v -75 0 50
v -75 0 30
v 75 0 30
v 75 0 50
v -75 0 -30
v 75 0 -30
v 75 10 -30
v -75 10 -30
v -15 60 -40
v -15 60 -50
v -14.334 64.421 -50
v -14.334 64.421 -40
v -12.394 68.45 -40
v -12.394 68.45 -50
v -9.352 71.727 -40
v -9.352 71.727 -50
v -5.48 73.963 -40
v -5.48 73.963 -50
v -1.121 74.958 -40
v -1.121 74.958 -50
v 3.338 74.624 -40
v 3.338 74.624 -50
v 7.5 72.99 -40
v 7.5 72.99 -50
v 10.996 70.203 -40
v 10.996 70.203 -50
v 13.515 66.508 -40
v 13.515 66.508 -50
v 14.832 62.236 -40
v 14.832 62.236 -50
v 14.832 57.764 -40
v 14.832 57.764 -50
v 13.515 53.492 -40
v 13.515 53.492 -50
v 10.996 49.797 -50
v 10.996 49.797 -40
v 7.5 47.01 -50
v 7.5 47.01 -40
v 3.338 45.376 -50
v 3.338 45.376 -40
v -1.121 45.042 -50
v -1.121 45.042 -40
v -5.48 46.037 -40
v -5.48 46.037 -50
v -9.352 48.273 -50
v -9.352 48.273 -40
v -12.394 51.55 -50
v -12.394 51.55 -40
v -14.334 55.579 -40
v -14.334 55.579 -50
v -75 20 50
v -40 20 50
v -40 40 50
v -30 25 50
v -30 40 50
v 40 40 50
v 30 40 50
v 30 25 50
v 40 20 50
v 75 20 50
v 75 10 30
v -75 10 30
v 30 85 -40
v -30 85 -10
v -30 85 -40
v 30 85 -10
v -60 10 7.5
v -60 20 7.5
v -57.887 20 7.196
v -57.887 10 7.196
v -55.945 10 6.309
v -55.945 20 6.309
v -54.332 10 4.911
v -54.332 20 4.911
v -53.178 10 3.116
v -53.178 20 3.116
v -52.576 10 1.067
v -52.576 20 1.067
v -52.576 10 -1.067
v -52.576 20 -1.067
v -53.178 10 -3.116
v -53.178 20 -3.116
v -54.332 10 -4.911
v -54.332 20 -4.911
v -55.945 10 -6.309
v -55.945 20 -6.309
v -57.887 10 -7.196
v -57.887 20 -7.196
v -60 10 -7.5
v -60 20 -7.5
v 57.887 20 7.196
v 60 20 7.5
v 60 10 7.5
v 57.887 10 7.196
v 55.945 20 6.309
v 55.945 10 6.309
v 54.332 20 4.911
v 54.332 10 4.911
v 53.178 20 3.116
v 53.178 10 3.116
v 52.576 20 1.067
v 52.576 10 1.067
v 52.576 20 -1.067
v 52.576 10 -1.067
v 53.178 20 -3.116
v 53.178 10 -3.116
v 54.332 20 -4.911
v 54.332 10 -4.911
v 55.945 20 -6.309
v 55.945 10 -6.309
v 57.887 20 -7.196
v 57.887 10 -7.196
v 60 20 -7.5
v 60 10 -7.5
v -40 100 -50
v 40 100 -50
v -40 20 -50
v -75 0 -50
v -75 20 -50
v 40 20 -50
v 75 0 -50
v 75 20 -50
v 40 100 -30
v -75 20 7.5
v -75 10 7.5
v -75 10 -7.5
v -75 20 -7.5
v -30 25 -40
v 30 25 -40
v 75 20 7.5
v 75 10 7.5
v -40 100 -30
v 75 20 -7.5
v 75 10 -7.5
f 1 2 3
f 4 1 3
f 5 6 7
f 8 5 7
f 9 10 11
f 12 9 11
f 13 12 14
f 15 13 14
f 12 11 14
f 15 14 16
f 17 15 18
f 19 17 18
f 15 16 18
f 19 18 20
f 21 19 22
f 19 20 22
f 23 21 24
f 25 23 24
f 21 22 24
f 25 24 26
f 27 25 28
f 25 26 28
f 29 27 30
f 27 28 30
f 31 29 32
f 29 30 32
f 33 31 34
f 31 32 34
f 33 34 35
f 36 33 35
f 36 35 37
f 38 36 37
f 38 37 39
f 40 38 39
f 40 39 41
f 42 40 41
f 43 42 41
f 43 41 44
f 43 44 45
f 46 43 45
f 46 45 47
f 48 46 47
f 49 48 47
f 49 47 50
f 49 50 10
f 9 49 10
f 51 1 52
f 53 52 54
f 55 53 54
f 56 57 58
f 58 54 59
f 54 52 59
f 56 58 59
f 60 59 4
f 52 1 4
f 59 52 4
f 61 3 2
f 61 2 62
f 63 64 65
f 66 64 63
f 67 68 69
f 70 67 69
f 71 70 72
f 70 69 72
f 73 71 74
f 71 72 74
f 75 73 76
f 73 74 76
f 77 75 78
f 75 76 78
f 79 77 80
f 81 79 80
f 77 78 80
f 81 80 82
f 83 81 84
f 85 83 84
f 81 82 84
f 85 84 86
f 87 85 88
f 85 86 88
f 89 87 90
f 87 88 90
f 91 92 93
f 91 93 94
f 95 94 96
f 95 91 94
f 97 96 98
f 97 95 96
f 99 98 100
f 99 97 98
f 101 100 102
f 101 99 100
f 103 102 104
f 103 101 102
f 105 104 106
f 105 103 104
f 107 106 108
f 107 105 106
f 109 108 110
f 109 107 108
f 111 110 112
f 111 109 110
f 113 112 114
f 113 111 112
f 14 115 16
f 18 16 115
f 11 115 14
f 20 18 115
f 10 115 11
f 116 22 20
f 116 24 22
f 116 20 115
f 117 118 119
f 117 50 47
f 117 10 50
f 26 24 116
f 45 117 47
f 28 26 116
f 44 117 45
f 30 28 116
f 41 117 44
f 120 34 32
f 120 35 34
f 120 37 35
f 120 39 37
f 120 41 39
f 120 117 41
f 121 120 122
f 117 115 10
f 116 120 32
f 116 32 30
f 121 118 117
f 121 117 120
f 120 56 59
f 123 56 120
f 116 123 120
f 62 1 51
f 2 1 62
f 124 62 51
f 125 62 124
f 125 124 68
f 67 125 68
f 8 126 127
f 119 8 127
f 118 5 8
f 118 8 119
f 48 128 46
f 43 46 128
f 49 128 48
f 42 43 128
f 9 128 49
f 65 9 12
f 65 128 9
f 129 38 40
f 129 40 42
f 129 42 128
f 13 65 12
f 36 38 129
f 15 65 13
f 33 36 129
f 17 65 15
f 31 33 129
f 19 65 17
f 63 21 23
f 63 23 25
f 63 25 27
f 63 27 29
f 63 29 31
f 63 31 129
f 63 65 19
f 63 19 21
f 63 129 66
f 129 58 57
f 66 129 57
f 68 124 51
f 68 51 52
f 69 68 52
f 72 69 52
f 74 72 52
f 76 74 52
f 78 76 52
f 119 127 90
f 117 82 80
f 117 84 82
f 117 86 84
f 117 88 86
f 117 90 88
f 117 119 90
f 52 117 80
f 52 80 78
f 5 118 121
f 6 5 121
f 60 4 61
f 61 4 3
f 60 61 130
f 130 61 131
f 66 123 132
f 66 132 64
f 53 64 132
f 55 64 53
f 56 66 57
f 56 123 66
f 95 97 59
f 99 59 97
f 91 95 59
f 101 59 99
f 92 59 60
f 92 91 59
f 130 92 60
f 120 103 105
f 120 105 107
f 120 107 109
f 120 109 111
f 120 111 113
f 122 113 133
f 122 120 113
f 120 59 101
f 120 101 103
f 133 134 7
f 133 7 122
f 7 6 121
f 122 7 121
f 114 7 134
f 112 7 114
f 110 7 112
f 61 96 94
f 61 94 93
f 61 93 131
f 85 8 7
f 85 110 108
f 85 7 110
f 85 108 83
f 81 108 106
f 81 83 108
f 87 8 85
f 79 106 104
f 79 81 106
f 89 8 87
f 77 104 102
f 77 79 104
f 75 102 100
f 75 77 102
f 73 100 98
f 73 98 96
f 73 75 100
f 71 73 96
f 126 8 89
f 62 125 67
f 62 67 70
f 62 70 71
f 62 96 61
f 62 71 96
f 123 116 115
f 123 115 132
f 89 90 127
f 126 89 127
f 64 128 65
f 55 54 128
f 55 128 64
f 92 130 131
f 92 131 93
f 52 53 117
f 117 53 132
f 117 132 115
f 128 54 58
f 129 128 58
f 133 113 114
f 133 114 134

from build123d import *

# Parameters (mm, degrees)
SKETCH1_W           = 150
SKETCH1_H           = 100
BOSS_EXTRUDE1_DEPTH = 20
SKETCH2_W           = 60
SKETCH2_H           = 10
CUT_EXTRUDE1_DEPTH  = 151
CUT_EXTRUDE2_DEPTH  = 20
BOSS_EXTRUDE3_DEPTH = 40
SKETCH10_W          = 60
SKETCH10_H          = 60
CUT_EXTRUDE3_DEPTH  = 90
SKETCH11_R          = 15
CUT_EXTRUDE4_DEPTH  = 90


with BuildPart() as part:
    # Sketch1 → Boss-Extrude1 (new body)
    with BuildSketch(Plane(origin=(0, 0, 0), x_dir=(1, 0, 0), z_dir=(0, 1, 0))):
        Rectangle(SKETCH1_W, SKETCH1_H)
    extrude(amount=BOSS_EXTRUDE1_DEPTH)

    # Sketch2 → Cut-Extrude1 (cut, through all)
    with BuildSketch(Plane.ZY.offset(75)):
        with Locations((0, 5)):
            Rectangle(SKETCH2_W, SKETCH2_H)
    extrude(amount=-CUT_EXTRUDE1_DEPTH, mode=Mode.SUBTRACT)

    # Sketch3 → Cut-Extrude2 (cut)
    with BuildSketch(Plane(origin=(0, 20, 0), x_dir=(1, 0, 0), z_dir=(0, 1, 0))):
        with BuildLine():
            Line((-75, 7.5), (-75, -7.5))
            Line((-75, -7.5), (-60, -7.5))
            ThreePointArc((-60, -7.5), (-52.5, 0), (-60, 7.5))
            Line((-60, 7.5), (-75, 7.5))
        make_face()
        with BuildLine():
            Line((75, 7.5), (75, -7.5))
            Line((75, -7.5), (60, -7.5))
            ThreePointArc((60, -7.5), (52.5, 0), (60, 7.5))
            Line((60, 7.5), (75, 7.5))
        make_face()
    extrude(amount=-CUT_EXTRUDE2_DEPTH, mode=Mode.SUBTRACT)

    # Sketch8 → Boss-Extrude3 (add, symmetric)
    with BuildSketch(Plane(origin=(0, 0, 0), x_dir=(0, 0, -1), z_dir=(1, 0, 0))):
        Polygon((50, 20), (50, 100), (30, 100), (-50, 40), (-50, 20), align=None)
    extrude(amount=BOSS_EXTRUDE3_DEPTH, both=True)

    # Sketch10 → Cut-Extrude3 (cut)
    with BuildSketch(Plane.XY.offset(50)):
        with Locations((0, 55)):
            Rectangle(SKETCH10_W, SKETCH10_H)
    extrude(amount=-CUT_EXTRUDE3_DEPTH, mode=Mode.SUBTRACT)

    # Sketch11 → Cut-Extrude4 (cut)
    with BuildSketch(Plane(origin=(0, 0, -50), x_dir=(-1, 0, 0), z_dir=(0, 0, -1))):
        with Locations((0, 60)):
            Circle(SKETCH11_R)
    extrude(amount=-CUT_EXTRUDE4_DEPTH, mode=Mode.SUBTRACT)


solid = part.part
